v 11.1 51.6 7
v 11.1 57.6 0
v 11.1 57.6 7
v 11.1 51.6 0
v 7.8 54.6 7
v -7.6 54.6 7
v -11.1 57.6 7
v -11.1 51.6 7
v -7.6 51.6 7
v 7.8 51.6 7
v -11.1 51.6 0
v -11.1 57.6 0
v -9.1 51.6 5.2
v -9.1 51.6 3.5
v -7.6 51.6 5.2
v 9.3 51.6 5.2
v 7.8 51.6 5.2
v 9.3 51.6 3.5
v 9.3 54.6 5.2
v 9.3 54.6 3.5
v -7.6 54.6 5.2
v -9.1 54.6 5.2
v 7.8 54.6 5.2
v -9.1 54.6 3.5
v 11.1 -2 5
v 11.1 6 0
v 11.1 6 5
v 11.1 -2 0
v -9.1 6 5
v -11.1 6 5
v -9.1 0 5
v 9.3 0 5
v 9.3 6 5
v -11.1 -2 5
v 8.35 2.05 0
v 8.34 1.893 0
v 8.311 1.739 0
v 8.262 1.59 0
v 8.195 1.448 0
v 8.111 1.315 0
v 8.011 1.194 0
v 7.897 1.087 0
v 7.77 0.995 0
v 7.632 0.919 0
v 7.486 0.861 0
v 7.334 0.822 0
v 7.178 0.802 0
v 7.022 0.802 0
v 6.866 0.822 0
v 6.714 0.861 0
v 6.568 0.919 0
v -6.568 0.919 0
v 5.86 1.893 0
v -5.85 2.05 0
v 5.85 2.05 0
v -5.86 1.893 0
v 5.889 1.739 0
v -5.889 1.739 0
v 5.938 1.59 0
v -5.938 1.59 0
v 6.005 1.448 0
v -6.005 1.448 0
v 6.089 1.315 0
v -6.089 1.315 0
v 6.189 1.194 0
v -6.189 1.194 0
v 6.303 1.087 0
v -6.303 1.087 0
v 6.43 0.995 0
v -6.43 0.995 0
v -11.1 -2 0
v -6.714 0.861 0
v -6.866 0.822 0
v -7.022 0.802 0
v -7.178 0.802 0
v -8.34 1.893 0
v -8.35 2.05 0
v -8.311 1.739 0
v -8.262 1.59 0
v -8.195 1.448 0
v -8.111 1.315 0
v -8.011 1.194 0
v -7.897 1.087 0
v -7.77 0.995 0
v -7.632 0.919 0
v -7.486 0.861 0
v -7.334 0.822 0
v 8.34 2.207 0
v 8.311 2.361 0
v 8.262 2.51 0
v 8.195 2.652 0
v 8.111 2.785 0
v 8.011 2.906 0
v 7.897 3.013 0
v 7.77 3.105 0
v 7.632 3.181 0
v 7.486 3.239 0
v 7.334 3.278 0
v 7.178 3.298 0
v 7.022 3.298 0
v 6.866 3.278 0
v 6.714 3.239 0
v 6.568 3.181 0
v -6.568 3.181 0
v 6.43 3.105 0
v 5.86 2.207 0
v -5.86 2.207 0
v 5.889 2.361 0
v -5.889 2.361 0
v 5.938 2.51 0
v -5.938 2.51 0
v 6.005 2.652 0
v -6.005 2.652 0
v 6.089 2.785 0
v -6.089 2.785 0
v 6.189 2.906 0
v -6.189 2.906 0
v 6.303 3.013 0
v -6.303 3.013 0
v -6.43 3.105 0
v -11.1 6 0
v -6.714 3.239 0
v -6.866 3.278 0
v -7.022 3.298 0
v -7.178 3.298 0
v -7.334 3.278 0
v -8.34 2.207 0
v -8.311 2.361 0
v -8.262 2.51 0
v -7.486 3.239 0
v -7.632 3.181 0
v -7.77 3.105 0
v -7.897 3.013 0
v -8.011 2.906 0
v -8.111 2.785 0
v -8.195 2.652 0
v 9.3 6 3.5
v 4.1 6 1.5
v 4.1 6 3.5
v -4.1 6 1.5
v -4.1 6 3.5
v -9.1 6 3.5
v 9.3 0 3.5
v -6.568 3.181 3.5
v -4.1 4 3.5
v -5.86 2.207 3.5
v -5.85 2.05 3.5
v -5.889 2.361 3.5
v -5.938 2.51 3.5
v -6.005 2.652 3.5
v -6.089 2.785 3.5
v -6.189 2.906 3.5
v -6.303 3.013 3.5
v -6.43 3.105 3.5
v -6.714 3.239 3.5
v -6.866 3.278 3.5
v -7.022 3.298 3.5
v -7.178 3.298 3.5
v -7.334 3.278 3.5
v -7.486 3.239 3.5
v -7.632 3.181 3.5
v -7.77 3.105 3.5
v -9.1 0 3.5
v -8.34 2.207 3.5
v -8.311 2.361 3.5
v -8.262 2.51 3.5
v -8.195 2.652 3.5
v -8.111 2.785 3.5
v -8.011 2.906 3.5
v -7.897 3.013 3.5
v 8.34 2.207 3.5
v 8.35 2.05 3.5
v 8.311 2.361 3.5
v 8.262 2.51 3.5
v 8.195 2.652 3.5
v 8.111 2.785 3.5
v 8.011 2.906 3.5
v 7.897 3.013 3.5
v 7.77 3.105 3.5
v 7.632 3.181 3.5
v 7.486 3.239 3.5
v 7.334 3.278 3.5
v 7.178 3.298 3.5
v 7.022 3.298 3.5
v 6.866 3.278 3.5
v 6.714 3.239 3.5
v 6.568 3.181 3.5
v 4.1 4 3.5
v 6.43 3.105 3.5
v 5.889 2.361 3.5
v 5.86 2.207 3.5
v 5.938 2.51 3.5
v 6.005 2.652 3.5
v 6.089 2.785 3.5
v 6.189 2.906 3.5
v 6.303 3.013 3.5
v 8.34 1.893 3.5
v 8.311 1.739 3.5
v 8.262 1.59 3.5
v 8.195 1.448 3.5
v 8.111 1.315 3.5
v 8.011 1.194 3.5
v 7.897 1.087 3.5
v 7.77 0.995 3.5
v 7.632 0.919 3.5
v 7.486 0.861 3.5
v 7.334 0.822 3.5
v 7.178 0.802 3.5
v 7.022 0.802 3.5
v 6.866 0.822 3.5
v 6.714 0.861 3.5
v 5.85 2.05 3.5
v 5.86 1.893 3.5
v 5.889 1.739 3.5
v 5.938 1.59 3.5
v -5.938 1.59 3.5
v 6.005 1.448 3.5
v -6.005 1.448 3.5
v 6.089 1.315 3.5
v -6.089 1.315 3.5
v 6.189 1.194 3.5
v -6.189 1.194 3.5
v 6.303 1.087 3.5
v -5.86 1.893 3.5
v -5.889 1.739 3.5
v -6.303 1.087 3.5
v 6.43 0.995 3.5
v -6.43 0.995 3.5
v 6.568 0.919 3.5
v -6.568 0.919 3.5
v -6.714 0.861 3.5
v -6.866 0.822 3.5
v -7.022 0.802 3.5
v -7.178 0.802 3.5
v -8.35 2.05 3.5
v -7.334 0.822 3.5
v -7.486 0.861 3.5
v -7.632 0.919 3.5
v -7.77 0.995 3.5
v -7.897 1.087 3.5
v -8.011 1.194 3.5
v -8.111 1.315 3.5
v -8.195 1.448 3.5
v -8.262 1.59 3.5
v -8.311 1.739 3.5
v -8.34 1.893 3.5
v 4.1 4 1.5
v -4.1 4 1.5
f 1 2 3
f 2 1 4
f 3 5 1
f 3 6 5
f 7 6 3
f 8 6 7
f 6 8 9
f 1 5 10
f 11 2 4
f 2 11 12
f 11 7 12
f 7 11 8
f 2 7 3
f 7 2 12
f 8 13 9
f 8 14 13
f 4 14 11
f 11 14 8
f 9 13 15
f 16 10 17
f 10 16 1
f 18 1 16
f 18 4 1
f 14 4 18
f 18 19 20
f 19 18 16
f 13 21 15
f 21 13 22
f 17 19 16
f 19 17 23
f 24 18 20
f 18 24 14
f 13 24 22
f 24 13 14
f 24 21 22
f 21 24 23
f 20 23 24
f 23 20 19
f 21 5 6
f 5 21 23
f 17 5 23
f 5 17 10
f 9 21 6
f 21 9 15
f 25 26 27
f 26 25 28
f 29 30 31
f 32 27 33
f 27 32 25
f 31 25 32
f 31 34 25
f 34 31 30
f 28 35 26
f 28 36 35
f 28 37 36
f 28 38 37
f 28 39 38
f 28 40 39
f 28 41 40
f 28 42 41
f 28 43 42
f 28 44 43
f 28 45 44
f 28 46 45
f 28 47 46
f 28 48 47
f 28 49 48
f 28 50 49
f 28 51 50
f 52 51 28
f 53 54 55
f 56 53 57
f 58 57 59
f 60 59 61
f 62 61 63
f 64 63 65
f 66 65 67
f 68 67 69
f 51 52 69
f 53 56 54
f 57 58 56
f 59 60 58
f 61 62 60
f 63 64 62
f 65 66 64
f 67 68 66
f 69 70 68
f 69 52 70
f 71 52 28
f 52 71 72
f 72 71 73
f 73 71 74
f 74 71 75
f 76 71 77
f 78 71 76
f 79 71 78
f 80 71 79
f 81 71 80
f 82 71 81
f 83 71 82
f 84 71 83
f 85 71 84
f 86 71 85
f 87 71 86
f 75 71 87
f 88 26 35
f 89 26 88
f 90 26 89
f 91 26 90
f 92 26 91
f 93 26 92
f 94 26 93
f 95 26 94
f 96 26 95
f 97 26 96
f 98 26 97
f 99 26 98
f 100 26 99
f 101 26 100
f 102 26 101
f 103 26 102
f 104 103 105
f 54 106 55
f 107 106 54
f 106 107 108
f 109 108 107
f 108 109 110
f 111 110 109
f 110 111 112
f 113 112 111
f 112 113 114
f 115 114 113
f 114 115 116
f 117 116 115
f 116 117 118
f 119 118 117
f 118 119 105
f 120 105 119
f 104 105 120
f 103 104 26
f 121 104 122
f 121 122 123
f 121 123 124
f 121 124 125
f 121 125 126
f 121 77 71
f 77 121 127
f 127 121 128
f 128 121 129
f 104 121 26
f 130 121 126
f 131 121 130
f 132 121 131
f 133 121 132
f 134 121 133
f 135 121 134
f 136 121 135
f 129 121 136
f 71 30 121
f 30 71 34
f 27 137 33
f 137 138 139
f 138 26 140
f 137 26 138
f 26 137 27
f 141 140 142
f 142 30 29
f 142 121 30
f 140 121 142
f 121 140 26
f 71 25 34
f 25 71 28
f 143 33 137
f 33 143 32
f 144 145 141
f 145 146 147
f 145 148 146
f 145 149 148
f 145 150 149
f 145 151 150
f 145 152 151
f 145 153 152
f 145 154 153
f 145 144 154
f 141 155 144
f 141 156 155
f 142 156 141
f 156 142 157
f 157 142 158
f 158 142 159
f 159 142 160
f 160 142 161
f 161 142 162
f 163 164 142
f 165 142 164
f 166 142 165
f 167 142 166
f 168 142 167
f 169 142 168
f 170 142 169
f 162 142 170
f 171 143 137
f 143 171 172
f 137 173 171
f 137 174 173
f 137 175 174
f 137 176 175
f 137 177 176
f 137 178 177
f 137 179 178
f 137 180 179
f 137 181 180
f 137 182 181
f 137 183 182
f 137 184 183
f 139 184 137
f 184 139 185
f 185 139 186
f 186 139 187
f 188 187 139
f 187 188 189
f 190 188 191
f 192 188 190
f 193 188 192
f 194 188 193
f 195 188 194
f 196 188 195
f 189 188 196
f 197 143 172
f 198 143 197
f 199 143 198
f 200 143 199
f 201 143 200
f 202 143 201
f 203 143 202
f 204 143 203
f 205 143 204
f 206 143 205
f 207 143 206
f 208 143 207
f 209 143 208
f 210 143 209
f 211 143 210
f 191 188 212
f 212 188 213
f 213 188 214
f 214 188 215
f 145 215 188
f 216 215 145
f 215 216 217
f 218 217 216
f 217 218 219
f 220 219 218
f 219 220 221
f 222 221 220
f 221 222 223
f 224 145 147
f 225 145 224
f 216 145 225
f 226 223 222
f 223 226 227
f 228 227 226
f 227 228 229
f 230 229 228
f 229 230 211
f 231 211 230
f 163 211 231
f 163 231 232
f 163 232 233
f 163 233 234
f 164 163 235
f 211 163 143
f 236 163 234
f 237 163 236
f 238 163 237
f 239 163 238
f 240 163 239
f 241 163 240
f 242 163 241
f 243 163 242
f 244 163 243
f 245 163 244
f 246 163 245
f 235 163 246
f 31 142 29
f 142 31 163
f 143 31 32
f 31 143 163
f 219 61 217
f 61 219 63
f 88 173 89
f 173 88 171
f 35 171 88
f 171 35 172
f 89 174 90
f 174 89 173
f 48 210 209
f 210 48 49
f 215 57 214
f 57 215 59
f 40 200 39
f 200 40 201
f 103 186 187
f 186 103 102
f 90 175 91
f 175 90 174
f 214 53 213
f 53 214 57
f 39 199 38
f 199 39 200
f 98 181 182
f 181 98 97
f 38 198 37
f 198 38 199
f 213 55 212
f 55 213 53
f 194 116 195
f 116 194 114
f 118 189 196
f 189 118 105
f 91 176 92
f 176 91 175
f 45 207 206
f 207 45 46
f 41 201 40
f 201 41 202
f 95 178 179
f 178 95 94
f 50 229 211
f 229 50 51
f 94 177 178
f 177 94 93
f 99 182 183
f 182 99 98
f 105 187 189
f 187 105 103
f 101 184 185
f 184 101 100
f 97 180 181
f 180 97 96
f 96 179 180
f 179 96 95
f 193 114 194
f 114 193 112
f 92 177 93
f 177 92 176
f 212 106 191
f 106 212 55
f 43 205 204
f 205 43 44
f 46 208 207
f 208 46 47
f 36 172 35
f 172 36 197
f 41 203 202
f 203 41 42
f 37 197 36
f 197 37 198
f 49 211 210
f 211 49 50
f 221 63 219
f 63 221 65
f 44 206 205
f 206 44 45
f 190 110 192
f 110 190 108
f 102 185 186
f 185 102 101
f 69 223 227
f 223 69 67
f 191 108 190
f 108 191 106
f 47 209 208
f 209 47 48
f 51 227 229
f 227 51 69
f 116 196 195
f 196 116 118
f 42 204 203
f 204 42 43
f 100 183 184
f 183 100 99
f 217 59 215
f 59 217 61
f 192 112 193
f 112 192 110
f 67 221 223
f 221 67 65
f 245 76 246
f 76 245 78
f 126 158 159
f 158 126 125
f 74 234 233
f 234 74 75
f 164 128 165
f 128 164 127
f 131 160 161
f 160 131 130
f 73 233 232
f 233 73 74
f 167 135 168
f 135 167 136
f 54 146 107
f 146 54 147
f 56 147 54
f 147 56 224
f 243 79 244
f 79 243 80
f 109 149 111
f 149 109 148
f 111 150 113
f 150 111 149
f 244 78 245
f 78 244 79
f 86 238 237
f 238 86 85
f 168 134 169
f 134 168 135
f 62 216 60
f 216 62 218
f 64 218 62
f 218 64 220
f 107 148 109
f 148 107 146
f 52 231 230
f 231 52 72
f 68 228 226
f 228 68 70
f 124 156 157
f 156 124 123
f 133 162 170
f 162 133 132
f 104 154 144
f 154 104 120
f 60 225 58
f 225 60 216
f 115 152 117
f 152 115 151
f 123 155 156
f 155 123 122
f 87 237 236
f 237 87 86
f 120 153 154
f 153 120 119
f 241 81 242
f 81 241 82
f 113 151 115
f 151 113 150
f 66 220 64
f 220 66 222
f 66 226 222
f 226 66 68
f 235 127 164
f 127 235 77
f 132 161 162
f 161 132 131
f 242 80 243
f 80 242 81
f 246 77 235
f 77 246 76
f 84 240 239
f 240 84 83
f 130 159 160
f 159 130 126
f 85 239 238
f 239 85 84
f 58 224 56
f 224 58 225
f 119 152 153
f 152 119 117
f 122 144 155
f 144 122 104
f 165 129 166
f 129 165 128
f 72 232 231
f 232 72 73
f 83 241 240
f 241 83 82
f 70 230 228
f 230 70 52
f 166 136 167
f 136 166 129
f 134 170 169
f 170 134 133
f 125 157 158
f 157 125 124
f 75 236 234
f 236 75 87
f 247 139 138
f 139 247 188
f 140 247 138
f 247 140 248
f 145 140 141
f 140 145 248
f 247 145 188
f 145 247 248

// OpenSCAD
/*
Copyright 2018 Michael Gläser

Licensed under the Apache License, Version 2.0 (the "License");
you may not use this file except in compliance with the License.
You may obtain a copy of the License at

    http://www.apache.org/licenses/LICENSE-2.0

Unless required by applicable law or agreed to in writing, software
distributed under the License is distributed on an "AS IS" BASIS,
WITHOUT WARRANTIES OR CONDITIONS OF ANY KIND, either express or implied.
See the License for the specific language governing permissions and
limitations under the License.
*/

// PCB Technical Data
pcbWidth = 18.2;
pcbDepth = 53.4;
pcbHeight = 1.5;

bottomGap = 3.5;

// holes
$fn = 50;
holeDiameter = 2.5;
holeDistanceX = 14.2; // distance between both holes
holeDistanceY = 49.2; // distance from pcb border

module pcb() {
    $fn = 50;
    holeDiameter = 3.0;
    holeDistanceX = 14.2; // distance between both holes
    holeDistanceY = 49.2; // distance from pcb border
    
    difference() {
        translate([-pcbWidth/2,-pcbDepth/2,0]) {
            cube([pcbWidth, pcbDepth, pcbHeight]);
        };
        translate([holeDistanceX/2,holeDistanceY/2,0]) {
            cylinder(h=pcbHeight, r=holeDiameter/2);
        };
        translate([-holeDistanceX/2,holeDistanceY/2,0]) {
            cylinder(h=pcbHeight, r=holeDiameter/2);
        };
        translate([holeDistanceX/2,-holeDistanceY/2,0]) {
            cylinder(h=pcbHeight, r=holeDiameter/2);
        };
        translate([-holeDistanceX/2,-holeDistanceY/2,0]) {
            cylinder(h=pcbHeight, r=holeDiameter/2);
        };
    };
}

module pierPlug() {
    borderX = 2;
    borderY = 3;
    borderZ = 2;
    pierDepth = 3;
    edgeX = 1.5;
    translate([-(pcbWidth/2+borderX),-pierDepth,0]) {
        difference() {
            cube([pcbWidth+2*borderX,borderY+pierDepth,bottomGap+pcbHeight+borderZ]);
            translate([borderX,0,bottomGap]) {
                cube([pcbWidth+0.2,pierDepth,pcbHeight+0.2]);
            };
            translate([borderX+edgeX,0,bottomGap+pcbHeight]) {
                cube([pcbWidth+0.2-2*edgeX,pierDepth,pcbHeight+borderZ]);
            };
        };
    };
};

module pierScrew() {
    borderX = 2;
    borderY = 2;
    pierDepth = 6;
    pinspaceX = pcbWidth-10;
    pinspaceY = pierDepth-4;
    pinspaceZ = 2;
    
    difference() {
        translate([-(pcbWidth/2+borderX),-(borderY),0]) {
            difference() {
                cube([pcbWidth+2*borderX,pierDepth+borderY,bottomGap+pcbHeight]);
                translate([borderX,borderY,bottomGap]) {
                    cube([pcbWidth+0.2,pierDepth,pcbHeight+0.2]);
                };
            };
        };
        // holes
        translate([holeDistanceX/2,0.8+holeDiameter/2,0]) {
            cylinder(h=bottomGap, r=holeDiameter/2);
        };
        translate([-holeDistanceX/2,0.8+holeDiameter/2,0]) {
            cylinder(h=bottomGap, r=holeDiameter/2);
        };
        // pin space
        translate([-pinspaceX/2,pierDepth-pinspaceY,bottomGap-pinspaceZ]) {
            cube([pinspaceX,pinspaceY,pinspaceZ]);
        };        
    };
};

module relaisMount() {
    //pcb();
    translate([0,pcbDepth+1.2,0]) {
        pierPlug();
    };
    translate([0,0,0]) {
        pierScrew();
    };
}

relaisMount();
